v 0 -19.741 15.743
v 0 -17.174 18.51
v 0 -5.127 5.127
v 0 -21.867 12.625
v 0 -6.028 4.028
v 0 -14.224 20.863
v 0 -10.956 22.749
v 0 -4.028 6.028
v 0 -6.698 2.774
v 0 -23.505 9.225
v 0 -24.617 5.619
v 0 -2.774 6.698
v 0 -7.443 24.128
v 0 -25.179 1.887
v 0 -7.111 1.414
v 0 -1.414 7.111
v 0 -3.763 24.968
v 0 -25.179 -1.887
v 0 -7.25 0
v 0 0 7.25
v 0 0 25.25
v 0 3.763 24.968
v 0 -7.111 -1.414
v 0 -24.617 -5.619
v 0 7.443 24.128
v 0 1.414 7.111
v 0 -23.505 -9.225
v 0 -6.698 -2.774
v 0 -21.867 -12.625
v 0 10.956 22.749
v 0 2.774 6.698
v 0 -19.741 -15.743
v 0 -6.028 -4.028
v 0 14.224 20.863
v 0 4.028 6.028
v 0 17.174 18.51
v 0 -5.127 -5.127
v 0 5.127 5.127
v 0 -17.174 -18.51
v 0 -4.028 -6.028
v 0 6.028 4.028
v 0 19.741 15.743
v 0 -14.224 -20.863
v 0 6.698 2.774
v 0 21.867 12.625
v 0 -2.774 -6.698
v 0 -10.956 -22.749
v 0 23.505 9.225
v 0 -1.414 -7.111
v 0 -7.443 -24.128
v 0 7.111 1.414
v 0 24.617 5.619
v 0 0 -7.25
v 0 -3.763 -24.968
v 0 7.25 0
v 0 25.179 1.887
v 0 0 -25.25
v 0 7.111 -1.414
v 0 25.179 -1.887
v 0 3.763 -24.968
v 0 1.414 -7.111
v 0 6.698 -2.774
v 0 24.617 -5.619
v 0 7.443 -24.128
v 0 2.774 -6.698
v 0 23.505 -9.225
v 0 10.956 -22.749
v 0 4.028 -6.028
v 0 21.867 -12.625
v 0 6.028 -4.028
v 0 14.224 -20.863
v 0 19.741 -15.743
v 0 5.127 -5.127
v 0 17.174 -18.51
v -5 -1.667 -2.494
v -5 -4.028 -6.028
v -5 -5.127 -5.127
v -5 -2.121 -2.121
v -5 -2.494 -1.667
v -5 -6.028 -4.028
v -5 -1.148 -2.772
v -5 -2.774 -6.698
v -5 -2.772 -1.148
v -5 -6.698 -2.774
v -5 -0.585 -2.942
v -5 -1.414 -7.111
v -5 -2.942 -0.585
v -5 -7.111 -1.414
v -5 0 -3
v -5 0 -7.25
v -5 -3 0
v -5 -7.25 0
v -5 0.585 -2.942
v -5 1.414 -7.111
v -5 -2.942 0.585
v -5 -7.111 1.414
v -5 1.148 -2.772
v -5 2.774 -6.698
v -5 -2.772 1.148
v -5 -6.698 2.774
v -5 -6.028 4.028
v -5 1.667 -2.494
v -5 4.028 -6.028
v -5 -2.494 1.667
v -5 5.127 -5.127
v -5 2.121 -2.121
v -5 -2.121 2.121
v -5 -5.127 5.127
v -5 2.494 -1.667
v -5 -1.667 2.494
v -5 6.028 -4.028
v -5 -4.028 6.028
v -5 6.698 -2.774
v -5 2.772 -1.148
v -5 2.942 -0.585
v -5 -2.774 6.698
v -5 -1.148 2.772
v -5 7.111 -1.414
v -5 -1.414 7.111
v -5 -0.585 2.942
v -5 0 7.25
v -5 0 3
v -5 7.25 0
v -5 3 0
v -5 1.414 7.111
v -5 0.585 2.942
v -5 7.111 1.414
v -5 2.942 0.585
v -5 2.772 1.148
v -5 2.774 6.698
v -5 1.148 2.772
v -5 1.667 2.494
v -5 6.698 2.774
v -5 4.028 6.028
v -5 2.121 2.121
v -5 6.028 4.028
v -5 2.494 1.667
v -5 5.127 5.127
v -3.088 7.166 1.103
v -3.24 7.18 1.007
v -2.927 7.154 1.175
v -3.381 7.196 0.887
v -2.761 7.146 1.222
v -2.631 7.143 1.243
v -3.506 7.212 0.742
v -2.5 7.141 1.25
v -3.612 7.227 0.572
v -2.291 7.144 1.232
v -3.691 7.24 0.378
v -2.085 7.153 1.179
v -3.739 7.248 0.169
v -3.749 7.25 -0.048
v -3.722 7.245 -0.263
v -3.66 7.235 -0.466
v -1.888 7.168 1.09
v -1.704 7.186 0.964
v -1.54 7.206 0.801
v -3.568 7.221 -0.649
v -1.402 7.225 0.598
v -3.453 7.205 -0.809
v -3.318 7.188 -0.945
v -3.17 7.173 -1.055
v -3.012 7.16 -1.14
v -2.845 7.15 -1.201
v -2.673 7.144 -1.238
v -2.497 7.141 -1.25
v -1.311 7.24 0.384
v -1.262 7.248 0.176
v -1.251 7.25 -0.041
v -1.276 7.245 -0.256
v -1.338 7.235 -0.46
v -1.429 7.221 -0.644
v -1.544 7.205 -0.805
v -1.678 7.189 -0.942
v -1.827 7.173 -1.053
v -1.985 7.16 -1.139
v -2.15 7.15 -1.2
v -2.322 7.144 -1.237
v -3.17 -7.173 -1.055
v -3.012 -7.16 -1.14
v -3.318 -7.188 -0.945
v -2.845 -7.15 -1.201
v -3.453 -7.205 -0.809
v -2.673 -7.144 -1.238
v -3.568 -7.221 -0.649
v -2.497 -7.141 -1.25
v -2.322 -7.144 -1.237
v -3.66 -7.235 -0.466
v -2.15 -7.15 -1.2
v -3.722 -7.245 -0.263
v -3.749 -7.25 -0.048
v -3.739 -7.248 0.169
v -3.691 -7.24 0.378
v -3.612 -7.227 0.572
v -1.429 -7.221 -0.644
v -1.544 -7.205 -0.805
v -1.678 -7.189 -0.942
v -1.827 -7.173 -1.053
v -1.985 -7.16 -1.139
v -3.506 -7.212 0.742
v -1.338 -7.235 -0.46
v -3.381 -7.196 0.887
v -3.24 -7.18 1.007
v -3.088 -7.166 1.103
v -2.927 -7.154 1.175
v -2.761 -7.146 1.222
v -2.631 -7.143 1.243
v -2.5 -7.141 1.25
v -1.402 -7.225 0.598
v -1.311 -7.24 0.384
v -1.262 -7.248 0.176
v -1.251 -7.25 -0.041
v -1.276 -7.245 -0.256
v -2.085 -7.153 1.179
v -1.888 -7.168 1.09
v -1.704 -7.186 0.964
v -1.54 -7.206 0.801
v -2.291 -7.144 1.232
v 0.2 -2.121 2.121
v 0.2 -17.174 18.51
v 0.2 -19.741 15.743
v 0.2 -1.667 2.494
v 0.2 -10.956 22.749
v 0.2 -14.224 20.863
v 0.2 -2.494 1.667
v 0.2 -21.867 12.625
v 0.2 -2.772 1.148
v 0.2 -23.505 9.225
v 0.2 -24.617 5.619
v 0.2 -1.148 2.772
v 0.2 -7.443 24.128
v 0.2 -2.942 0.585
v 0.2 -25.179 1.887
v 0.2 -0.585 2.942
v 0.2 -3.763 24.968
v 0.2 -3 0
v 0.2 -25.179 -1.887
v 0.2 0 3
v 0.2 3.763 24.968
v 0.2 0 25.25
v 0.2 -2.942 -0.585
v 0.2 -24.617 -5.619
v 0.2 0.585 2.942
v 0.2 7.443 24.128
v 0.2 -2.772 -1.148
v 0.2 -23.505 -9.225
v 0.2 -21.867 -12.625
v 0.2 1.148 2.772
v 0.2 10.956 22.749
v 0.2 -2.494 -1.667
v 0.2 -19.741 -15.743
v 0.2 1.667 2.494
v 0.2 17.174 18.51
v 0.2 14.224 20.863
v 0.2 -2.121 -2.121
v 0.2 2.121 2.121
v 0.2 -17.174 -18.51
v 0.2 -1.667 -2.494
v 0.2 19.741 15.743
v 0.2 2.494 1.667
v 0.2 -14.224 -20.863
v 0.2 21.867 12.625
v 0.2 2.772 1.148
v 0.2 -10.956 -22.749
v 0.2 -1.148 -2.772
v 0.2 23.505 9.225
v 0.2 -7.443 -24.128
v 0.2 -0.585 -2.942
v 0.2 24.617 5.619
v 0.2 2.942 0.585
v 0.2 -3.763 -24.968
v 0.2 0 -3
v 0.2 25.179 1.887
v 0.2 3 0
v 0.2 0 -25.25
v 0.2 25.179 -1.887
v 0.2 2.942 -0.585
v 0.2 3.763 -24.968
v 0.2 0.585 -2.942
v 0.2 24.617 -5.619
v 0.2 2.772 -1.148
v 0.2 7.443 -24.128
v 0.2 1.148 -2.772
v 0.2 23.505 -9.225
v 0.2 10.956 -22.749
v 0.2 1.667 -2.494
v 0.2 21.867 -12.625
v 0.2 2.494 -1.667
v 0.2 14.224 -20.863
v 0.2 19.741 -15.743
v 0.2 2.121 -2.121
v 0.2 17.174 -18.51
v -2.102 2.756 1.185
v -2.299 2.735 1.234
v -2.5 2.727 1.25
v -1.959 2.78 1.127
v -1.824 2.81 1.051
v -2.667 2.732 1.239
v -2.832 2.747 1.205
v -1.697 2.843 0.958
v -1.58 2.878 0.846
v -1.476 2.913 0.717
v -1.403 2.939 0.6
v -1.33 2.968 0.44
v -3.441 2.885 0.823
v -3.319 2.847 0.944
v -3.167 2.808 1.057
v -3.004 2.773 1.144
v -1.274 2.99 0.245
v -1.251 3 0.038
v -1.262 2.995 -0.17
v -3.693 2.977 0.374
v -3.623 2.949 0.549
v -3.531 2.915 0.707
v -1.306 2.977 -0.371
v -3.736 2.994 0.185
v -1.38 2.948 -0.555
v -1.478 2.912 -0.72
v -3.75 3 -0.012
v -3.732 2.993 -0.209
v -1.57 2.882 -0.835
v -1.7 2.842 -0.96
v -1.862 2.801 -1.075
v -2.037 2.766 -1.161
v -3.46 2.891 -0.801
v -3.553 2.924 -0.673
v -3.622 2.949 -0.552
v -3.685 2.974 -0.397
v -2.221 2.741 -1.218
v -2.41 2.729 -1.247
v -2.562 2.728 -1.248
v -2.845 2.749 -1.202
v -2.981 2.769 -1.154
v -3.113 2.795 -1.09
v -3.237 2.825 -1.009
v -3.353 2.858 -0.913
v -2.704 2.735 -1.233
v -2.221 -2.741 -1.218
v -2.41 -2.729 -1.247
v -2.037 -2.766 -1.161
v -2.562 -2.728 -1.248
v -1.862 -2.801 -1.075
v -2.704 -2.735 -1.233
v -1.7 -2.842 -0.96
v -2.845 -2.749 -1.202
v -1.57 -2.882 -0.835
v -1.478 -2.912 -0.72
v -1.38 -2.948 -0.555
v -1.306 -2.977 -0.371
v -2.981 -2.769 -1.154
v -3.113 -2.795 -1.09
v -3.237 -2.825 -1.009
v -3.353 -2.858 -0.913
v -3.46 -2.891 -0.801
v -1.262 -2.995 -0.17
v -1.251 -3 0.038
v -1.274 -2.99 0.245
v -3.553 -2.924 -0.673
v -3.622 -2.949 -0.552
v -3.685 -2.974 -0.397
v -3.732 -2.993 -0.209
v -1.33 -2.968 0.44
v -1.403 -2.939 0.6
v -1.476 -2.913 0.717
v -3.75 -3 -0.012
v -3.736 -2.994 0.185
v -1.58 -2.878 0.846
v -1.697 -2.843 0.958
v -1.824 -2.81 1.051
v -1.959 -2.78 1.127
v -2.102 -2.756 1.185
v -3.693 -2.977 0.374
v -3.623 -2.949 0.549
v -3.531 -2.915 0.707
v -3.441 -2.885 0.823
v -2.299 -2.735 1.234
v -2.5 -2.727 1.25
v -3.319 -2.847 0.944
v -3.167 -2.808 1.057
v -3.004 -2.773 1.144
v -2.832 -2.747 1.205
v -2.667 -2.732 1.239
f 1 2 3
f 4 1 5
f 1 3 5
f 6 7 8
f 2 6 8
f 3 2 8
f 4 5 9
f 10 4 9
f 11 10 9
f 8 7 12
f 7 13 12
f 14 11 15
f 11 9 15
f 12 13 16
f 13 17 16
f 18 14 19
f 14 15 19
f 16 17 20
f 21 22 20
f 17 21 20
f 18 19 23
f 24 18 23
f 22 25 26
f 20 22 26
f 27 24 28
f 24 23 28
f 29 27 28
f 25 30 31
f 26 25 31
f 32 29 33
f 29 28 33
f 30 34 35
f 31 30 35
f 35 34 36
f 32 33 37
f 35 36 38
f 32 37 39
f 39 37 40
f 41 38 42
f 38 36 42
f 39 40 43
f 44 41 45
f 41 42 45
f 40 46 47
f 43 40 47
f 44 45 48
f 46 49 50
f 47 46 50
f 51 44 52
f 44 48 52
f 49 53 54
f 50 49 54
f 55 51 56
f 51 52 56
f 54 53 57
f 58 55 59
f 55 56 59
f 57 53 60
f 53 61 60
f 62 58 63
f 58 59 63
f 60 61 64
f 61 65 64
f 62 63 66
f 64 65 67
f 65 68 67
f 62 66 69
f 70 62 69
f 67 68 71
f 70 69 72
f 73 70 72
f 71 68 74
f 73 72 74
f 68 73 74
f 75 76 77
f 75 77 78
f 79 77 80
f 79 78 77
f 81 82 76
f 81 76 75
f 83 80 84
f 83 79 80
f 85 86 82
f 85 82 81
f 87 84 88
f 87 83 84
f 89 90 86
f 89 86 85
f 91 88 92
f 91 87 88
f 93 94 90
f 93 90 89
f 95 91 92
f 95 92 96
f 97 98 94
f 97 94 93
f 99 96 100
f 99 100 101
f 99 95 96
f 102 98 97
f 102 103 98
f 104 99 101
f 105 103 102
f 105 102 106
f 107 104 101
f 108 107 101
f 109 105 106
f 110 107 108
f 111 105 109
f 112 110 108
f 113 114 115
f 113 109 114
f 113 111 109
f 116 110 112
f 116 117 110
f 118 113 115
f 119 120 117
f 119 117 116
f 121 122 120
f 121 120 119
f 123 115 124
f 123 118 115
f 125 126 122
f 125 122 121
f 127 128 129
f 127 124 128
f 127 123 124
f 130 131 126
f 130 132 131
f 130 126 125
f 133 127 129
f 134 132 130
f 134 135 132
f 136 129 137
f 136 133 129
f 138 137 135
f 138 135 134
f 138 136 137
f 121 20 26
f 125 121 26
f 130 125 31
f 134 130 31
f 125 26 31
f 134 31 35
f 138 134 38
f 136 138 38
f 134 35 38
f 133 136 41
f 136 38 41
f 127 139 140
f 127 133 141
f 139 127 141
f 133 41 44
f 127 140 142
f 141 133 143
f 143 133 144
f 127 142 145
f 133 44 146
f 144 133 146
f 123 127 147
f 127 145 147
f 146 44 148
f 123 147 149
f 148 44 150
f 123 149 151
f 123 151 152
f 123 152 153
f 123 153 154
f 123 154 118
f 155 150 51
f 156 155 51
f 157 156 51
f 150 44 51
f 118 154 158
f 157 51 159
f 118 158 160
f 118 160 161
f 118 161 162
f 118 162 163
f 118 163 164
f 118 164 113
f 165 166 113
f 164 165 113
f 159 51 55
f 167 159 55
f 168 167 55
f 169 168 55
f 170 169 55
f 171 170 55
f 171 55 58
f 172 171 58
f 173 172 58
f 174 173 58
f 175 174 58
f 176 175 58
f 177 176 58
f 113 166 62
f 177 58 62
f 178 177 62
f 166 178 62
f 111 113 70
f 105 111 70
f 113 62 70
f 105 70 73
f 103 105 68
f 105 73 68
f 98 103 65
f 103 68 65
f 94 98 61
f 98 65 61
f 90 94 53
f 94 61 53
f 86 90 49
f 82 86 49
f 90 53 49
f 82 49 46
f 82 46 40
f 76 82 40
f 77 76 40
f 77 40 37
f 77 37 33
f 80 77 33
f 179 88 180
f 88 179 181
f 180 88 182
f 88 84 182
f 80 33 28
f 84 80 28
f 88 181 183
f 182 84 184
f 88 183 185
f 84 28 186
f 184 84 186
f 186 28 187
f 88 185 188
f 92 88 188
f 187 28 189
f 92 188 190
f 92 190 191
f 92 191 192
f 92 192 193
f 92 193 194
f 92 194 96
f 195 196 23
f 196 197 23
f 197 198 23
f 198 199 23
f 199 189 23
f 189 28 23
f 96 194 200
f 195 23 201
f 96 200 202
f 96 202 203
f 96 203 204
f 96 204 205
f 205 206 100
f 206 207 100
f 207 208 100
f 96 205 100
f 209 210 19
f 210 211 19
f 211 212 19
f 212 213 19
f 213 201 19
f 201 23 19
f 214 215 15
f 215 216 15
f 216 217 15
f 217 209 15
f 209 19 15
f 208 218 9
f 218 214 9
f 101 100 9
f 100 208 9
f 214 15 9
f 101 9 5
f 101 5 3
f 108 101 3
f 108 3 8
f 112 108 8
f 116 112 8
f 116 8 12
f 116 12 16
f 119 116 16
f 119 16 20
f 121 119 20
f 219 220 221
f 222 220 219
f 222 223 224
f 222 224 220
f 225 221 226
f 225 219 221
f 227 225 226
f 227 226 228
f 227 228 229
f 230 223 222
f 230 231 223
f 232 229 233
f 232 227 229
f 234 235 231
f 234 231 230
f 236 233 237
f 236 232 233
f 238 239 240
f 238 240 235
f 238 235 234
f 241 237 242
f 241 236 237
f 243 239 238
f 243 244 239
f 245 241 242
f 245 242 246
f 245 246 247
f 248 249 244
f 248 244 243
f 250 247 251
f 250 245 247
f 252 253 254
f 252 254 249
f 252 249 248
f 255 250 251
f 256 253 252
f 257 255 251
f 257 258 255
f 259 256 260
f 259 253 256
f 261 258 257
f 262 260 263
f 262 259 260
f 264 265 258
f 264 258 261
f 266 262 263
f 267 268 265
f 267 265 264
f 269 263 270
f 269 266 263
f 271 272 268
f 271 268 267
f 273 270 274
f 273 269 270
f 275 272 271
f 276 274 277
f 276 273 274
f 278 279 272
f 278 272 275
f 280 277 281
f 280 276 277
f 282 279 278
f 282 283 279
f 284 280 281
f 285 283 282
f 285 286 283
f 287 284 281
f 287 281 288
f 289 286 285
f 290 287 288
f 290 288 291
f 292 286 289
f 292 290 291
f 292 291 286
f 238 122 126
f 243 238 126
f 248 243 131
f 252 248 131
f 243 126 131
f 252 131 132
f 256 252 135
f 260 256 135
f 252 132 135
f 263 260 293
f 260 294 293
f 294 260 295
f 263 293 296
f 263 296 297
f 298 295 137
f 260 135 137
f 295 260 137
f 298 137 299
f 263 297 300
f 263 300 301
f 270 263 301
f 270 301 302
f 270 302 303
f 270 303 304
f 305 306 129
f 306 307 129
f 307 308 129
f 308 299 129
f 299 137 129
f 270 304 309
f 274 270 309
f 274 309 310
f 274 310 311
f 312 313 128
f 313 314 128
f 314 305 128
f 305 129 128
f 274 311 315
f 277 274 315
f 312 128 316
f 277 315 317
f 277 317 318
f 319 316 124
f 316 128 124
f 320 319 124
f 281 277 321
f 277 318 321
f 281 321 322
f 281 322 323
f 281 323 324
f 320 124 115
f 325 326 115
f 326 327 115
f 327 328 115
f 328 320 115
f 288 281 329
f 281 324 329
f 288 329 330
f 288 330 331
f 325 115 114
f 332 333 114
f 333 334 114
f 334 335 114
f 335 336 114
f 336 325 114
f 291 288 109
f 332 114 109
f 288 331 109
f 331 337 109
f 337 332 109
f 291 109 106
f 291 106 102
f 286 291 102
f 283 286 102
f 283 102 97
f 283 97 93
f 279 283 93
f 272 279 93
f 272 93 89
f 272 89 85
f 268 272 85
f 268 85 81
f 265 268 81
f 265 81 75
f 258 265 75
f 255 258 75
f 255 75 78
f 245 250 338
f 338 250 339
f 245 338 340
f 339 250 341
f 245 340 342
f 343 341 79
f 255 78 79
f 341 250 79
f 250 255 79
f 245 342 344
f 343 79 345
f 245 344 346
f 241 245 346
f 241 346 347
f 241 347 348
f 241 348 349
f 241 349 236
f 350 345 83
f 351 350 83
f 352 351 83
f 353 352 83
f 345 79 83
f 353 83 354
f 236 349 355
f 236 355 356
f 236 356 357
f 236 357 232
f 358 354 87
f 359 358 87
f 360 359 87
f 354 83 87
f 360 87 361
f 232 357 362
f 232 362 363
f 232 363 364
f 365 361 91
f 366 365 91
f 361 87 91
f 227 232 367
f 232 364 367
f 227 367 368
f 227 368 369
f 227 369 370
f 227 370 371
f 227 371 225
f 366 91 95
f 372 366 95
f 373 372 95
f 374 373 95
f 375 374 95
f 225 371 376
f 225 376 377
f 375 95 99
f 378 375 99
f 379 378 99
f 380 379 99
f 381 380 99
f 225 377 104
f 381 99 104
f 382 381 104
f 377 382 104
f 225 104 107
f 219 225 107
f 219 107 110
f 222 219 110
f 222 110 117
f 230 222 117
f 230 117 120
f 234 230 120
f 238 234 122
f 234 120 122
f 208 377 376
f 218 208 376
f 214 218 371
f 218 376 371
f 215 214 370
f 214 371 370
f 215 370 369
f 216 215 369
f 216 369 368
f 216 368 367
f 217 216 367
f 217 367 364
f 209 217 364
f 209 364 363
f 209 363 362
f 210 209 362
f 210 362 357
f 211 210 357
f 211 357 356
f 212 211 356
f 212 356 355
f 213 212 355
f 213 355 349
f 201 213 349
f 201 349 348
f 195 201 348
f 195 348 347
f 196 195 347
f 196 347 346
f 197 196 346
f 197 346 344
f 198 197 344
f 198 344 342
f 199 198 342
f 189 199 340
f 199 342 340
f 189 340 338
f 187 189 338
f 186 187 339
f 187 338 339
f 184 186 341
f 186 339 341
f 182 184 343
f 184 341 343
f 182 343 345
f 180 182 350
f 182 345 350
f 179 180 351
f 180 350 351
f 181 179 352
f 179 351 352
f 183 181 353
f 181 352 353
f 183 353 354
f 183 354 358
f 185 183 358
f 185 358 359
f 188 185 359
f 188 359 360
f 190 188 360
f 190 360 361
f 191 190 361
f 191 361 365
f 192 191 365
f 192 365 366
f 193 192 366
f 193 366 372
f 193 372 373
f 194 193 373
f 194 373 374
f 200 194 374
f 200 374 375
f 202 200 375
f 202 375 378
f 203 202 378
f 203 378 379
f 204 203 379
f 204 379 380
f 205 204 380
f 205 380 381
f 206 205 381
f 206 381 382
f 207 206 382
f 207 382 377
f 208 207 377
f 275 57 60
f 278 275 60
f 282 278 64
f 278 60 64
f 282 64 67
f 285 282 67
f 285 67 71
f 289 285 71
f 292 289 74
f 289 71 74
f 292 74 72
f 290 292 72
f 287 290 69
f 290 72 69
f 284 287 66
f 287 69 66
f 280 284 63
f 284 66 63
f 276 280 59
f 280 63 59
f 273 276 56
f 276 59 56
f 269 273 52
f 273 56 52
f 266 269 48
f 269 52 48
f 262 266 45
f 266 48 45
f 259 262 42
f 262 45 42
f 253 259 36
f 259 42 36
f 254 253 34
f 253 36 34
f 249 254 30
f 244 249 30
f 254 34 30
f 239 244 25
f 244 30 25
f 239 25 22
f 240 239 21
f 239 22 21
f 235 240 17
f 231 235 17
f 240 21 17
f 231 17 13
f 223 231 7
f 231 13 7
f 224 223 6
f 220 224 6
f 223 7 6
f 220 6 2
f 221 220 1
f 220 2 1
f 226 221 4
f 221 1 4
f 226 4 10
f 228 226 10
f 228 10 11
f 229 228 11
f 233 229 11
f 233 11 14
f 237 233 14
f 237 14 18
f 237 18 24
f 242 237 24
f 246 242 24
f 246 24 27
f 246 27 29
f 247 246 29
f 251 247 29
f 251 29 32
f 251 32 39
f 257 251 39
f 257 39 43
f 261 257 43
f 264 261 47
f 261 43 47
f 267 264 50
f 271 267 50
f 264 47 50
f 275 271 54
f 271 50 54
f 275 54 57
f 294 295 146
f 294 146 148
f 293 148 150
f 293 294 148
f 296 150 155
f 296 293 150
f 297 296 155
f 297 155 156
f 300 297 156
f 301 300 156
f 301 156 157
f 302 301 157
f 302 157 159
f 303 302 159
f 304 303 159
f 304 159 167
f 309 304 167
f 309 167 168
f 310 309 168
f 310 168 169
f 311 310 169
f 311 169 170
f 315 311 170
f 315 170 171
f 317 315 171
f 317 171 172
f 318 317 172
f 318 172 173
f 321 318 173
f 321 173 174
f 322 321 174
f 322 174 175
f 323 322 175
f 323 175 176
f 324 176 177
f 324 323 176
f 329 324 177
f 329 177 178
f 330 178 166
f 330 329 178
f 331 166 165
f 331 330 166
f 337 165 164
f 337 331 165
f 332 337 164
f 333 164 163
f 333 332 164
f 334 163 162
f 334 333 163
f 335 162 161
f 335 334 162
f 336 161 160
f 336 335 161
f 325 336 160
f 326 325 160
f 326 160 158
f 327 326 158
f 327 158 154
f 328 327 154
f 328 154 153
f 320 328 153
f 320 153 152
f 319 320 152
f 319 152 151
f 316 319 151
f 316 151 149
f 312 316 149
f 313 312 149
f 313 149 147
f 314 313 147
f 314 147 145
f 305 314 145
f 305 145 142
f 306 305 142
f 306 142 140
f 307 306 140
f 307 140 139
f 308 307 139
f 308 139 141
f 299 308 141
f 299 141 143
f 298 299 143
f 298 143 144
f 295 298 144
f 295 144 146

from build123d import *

# Parameters (mm, degrees)
SKETCH_1_R                      = 25.25
EXTRUDE_1_DEPTH                 = 0.2
SKETCH_2_R                      = 7.25
EXTRUDE_2_DEPTH                 = 5
CUT_EXTRUDE_1_REACH             = 38.086
SKETCH_3_R                      = 3
CUT_EXTRUDE_2_REACH             = 38.057
SKETCH_4_R                      = 1.25
CUT_EXTRUDE_2_DIRECTION_2_REACH = 38.057


with BuildPart() as part:
    # 草图1 → 凸台-拉伸1 (new body)
    with BuildSketch(Plane(origin=(0, 0, 0), x_dir=(0, 0, -1), z_dir=(1, 0, 0))):
        Circle(SKETCH_1_R)
    extrude(amount=EXTRUDE_1_DEPTH)

    # 草图2 → 凸台-拉伸2 (add)
    with BuildSketch(Plane.ZY):
        Circle(SKETCH_2_R)
    extrude(amount=EXTRUDE_2_DEPTH)

    # 草图3 → 切除-拉伸1 (cut, up to next)
    with BuildSketch(Plane.ZY.offset(5), mode=Mode.PRIVATE) as cut_extrude_1_sk1:
        Circle(SKETCH_3_R)
    cut_extrude_1_tool1 = extrude(cut_extrude_1_sk1.sketch, amount=-CUT_EXTRUDE_1_REACH, mode=Mode.PRIVATE) & part.part
    add(cut_extrude_1_tool1.solids().sort_by_distance((-5, 0, 0))[0], mode=Mode.SUBTRACT)

    # 草图4 → 切除-拉伸2 (cut, up to next)
    with BuildSketch(Plane(origin=(0, 0, 0), x_dir=(1, 0, 0), z_dir=(0, 1, 0)), mode=Mode.PRIVATE) as cut_extrude_2_sk1:
        with Locations(Location((-2.5, 0, 0), (0, 0, 270))):
            Circle(SKETCH_4_R)
    cut_extrude_2_tool1 = extrude(cut_extrude_2_sk1.sketch, amount=-CUT_EXTRUDE_2_REACH, mode=Mode.PRIVATE) & part.part
    add(cut_extrude_2_tool1.solids().sort_by_distance((-2.5, 0, 0))[0], mode=Mode.SUBTRACT)

    # 草图4 → 切除-拉伸2 direction 2 (cut, up to next)
    with BuildSketch(Plane(origin=(0, 0, 0), x_dir=(1, 0, 0), z_dir=(0, 1, 0)), mode=Mode.PRIVATE) as cut_extrude_2_direction_2_sk1:
        with Locations(Location((-2.5, 0, 0), (0, 0, 270))):
            Circle(SKETCH_4_R)
    cut_extrude_2_direction_2_tool1 = extrude(cut_extrude_2_direction_2_sk1.sketch, amount=CUT_EXTRUDE_2_DIRECTION_2_REACH, mode=Mode.PRIVATE) & part.part
    add(cut_extrude_2_direction_2_tool1.solids().sort_by_distance((-2.5, 0, 0))[0], mode=Mode.SUBTRACT)


solid = part.part
